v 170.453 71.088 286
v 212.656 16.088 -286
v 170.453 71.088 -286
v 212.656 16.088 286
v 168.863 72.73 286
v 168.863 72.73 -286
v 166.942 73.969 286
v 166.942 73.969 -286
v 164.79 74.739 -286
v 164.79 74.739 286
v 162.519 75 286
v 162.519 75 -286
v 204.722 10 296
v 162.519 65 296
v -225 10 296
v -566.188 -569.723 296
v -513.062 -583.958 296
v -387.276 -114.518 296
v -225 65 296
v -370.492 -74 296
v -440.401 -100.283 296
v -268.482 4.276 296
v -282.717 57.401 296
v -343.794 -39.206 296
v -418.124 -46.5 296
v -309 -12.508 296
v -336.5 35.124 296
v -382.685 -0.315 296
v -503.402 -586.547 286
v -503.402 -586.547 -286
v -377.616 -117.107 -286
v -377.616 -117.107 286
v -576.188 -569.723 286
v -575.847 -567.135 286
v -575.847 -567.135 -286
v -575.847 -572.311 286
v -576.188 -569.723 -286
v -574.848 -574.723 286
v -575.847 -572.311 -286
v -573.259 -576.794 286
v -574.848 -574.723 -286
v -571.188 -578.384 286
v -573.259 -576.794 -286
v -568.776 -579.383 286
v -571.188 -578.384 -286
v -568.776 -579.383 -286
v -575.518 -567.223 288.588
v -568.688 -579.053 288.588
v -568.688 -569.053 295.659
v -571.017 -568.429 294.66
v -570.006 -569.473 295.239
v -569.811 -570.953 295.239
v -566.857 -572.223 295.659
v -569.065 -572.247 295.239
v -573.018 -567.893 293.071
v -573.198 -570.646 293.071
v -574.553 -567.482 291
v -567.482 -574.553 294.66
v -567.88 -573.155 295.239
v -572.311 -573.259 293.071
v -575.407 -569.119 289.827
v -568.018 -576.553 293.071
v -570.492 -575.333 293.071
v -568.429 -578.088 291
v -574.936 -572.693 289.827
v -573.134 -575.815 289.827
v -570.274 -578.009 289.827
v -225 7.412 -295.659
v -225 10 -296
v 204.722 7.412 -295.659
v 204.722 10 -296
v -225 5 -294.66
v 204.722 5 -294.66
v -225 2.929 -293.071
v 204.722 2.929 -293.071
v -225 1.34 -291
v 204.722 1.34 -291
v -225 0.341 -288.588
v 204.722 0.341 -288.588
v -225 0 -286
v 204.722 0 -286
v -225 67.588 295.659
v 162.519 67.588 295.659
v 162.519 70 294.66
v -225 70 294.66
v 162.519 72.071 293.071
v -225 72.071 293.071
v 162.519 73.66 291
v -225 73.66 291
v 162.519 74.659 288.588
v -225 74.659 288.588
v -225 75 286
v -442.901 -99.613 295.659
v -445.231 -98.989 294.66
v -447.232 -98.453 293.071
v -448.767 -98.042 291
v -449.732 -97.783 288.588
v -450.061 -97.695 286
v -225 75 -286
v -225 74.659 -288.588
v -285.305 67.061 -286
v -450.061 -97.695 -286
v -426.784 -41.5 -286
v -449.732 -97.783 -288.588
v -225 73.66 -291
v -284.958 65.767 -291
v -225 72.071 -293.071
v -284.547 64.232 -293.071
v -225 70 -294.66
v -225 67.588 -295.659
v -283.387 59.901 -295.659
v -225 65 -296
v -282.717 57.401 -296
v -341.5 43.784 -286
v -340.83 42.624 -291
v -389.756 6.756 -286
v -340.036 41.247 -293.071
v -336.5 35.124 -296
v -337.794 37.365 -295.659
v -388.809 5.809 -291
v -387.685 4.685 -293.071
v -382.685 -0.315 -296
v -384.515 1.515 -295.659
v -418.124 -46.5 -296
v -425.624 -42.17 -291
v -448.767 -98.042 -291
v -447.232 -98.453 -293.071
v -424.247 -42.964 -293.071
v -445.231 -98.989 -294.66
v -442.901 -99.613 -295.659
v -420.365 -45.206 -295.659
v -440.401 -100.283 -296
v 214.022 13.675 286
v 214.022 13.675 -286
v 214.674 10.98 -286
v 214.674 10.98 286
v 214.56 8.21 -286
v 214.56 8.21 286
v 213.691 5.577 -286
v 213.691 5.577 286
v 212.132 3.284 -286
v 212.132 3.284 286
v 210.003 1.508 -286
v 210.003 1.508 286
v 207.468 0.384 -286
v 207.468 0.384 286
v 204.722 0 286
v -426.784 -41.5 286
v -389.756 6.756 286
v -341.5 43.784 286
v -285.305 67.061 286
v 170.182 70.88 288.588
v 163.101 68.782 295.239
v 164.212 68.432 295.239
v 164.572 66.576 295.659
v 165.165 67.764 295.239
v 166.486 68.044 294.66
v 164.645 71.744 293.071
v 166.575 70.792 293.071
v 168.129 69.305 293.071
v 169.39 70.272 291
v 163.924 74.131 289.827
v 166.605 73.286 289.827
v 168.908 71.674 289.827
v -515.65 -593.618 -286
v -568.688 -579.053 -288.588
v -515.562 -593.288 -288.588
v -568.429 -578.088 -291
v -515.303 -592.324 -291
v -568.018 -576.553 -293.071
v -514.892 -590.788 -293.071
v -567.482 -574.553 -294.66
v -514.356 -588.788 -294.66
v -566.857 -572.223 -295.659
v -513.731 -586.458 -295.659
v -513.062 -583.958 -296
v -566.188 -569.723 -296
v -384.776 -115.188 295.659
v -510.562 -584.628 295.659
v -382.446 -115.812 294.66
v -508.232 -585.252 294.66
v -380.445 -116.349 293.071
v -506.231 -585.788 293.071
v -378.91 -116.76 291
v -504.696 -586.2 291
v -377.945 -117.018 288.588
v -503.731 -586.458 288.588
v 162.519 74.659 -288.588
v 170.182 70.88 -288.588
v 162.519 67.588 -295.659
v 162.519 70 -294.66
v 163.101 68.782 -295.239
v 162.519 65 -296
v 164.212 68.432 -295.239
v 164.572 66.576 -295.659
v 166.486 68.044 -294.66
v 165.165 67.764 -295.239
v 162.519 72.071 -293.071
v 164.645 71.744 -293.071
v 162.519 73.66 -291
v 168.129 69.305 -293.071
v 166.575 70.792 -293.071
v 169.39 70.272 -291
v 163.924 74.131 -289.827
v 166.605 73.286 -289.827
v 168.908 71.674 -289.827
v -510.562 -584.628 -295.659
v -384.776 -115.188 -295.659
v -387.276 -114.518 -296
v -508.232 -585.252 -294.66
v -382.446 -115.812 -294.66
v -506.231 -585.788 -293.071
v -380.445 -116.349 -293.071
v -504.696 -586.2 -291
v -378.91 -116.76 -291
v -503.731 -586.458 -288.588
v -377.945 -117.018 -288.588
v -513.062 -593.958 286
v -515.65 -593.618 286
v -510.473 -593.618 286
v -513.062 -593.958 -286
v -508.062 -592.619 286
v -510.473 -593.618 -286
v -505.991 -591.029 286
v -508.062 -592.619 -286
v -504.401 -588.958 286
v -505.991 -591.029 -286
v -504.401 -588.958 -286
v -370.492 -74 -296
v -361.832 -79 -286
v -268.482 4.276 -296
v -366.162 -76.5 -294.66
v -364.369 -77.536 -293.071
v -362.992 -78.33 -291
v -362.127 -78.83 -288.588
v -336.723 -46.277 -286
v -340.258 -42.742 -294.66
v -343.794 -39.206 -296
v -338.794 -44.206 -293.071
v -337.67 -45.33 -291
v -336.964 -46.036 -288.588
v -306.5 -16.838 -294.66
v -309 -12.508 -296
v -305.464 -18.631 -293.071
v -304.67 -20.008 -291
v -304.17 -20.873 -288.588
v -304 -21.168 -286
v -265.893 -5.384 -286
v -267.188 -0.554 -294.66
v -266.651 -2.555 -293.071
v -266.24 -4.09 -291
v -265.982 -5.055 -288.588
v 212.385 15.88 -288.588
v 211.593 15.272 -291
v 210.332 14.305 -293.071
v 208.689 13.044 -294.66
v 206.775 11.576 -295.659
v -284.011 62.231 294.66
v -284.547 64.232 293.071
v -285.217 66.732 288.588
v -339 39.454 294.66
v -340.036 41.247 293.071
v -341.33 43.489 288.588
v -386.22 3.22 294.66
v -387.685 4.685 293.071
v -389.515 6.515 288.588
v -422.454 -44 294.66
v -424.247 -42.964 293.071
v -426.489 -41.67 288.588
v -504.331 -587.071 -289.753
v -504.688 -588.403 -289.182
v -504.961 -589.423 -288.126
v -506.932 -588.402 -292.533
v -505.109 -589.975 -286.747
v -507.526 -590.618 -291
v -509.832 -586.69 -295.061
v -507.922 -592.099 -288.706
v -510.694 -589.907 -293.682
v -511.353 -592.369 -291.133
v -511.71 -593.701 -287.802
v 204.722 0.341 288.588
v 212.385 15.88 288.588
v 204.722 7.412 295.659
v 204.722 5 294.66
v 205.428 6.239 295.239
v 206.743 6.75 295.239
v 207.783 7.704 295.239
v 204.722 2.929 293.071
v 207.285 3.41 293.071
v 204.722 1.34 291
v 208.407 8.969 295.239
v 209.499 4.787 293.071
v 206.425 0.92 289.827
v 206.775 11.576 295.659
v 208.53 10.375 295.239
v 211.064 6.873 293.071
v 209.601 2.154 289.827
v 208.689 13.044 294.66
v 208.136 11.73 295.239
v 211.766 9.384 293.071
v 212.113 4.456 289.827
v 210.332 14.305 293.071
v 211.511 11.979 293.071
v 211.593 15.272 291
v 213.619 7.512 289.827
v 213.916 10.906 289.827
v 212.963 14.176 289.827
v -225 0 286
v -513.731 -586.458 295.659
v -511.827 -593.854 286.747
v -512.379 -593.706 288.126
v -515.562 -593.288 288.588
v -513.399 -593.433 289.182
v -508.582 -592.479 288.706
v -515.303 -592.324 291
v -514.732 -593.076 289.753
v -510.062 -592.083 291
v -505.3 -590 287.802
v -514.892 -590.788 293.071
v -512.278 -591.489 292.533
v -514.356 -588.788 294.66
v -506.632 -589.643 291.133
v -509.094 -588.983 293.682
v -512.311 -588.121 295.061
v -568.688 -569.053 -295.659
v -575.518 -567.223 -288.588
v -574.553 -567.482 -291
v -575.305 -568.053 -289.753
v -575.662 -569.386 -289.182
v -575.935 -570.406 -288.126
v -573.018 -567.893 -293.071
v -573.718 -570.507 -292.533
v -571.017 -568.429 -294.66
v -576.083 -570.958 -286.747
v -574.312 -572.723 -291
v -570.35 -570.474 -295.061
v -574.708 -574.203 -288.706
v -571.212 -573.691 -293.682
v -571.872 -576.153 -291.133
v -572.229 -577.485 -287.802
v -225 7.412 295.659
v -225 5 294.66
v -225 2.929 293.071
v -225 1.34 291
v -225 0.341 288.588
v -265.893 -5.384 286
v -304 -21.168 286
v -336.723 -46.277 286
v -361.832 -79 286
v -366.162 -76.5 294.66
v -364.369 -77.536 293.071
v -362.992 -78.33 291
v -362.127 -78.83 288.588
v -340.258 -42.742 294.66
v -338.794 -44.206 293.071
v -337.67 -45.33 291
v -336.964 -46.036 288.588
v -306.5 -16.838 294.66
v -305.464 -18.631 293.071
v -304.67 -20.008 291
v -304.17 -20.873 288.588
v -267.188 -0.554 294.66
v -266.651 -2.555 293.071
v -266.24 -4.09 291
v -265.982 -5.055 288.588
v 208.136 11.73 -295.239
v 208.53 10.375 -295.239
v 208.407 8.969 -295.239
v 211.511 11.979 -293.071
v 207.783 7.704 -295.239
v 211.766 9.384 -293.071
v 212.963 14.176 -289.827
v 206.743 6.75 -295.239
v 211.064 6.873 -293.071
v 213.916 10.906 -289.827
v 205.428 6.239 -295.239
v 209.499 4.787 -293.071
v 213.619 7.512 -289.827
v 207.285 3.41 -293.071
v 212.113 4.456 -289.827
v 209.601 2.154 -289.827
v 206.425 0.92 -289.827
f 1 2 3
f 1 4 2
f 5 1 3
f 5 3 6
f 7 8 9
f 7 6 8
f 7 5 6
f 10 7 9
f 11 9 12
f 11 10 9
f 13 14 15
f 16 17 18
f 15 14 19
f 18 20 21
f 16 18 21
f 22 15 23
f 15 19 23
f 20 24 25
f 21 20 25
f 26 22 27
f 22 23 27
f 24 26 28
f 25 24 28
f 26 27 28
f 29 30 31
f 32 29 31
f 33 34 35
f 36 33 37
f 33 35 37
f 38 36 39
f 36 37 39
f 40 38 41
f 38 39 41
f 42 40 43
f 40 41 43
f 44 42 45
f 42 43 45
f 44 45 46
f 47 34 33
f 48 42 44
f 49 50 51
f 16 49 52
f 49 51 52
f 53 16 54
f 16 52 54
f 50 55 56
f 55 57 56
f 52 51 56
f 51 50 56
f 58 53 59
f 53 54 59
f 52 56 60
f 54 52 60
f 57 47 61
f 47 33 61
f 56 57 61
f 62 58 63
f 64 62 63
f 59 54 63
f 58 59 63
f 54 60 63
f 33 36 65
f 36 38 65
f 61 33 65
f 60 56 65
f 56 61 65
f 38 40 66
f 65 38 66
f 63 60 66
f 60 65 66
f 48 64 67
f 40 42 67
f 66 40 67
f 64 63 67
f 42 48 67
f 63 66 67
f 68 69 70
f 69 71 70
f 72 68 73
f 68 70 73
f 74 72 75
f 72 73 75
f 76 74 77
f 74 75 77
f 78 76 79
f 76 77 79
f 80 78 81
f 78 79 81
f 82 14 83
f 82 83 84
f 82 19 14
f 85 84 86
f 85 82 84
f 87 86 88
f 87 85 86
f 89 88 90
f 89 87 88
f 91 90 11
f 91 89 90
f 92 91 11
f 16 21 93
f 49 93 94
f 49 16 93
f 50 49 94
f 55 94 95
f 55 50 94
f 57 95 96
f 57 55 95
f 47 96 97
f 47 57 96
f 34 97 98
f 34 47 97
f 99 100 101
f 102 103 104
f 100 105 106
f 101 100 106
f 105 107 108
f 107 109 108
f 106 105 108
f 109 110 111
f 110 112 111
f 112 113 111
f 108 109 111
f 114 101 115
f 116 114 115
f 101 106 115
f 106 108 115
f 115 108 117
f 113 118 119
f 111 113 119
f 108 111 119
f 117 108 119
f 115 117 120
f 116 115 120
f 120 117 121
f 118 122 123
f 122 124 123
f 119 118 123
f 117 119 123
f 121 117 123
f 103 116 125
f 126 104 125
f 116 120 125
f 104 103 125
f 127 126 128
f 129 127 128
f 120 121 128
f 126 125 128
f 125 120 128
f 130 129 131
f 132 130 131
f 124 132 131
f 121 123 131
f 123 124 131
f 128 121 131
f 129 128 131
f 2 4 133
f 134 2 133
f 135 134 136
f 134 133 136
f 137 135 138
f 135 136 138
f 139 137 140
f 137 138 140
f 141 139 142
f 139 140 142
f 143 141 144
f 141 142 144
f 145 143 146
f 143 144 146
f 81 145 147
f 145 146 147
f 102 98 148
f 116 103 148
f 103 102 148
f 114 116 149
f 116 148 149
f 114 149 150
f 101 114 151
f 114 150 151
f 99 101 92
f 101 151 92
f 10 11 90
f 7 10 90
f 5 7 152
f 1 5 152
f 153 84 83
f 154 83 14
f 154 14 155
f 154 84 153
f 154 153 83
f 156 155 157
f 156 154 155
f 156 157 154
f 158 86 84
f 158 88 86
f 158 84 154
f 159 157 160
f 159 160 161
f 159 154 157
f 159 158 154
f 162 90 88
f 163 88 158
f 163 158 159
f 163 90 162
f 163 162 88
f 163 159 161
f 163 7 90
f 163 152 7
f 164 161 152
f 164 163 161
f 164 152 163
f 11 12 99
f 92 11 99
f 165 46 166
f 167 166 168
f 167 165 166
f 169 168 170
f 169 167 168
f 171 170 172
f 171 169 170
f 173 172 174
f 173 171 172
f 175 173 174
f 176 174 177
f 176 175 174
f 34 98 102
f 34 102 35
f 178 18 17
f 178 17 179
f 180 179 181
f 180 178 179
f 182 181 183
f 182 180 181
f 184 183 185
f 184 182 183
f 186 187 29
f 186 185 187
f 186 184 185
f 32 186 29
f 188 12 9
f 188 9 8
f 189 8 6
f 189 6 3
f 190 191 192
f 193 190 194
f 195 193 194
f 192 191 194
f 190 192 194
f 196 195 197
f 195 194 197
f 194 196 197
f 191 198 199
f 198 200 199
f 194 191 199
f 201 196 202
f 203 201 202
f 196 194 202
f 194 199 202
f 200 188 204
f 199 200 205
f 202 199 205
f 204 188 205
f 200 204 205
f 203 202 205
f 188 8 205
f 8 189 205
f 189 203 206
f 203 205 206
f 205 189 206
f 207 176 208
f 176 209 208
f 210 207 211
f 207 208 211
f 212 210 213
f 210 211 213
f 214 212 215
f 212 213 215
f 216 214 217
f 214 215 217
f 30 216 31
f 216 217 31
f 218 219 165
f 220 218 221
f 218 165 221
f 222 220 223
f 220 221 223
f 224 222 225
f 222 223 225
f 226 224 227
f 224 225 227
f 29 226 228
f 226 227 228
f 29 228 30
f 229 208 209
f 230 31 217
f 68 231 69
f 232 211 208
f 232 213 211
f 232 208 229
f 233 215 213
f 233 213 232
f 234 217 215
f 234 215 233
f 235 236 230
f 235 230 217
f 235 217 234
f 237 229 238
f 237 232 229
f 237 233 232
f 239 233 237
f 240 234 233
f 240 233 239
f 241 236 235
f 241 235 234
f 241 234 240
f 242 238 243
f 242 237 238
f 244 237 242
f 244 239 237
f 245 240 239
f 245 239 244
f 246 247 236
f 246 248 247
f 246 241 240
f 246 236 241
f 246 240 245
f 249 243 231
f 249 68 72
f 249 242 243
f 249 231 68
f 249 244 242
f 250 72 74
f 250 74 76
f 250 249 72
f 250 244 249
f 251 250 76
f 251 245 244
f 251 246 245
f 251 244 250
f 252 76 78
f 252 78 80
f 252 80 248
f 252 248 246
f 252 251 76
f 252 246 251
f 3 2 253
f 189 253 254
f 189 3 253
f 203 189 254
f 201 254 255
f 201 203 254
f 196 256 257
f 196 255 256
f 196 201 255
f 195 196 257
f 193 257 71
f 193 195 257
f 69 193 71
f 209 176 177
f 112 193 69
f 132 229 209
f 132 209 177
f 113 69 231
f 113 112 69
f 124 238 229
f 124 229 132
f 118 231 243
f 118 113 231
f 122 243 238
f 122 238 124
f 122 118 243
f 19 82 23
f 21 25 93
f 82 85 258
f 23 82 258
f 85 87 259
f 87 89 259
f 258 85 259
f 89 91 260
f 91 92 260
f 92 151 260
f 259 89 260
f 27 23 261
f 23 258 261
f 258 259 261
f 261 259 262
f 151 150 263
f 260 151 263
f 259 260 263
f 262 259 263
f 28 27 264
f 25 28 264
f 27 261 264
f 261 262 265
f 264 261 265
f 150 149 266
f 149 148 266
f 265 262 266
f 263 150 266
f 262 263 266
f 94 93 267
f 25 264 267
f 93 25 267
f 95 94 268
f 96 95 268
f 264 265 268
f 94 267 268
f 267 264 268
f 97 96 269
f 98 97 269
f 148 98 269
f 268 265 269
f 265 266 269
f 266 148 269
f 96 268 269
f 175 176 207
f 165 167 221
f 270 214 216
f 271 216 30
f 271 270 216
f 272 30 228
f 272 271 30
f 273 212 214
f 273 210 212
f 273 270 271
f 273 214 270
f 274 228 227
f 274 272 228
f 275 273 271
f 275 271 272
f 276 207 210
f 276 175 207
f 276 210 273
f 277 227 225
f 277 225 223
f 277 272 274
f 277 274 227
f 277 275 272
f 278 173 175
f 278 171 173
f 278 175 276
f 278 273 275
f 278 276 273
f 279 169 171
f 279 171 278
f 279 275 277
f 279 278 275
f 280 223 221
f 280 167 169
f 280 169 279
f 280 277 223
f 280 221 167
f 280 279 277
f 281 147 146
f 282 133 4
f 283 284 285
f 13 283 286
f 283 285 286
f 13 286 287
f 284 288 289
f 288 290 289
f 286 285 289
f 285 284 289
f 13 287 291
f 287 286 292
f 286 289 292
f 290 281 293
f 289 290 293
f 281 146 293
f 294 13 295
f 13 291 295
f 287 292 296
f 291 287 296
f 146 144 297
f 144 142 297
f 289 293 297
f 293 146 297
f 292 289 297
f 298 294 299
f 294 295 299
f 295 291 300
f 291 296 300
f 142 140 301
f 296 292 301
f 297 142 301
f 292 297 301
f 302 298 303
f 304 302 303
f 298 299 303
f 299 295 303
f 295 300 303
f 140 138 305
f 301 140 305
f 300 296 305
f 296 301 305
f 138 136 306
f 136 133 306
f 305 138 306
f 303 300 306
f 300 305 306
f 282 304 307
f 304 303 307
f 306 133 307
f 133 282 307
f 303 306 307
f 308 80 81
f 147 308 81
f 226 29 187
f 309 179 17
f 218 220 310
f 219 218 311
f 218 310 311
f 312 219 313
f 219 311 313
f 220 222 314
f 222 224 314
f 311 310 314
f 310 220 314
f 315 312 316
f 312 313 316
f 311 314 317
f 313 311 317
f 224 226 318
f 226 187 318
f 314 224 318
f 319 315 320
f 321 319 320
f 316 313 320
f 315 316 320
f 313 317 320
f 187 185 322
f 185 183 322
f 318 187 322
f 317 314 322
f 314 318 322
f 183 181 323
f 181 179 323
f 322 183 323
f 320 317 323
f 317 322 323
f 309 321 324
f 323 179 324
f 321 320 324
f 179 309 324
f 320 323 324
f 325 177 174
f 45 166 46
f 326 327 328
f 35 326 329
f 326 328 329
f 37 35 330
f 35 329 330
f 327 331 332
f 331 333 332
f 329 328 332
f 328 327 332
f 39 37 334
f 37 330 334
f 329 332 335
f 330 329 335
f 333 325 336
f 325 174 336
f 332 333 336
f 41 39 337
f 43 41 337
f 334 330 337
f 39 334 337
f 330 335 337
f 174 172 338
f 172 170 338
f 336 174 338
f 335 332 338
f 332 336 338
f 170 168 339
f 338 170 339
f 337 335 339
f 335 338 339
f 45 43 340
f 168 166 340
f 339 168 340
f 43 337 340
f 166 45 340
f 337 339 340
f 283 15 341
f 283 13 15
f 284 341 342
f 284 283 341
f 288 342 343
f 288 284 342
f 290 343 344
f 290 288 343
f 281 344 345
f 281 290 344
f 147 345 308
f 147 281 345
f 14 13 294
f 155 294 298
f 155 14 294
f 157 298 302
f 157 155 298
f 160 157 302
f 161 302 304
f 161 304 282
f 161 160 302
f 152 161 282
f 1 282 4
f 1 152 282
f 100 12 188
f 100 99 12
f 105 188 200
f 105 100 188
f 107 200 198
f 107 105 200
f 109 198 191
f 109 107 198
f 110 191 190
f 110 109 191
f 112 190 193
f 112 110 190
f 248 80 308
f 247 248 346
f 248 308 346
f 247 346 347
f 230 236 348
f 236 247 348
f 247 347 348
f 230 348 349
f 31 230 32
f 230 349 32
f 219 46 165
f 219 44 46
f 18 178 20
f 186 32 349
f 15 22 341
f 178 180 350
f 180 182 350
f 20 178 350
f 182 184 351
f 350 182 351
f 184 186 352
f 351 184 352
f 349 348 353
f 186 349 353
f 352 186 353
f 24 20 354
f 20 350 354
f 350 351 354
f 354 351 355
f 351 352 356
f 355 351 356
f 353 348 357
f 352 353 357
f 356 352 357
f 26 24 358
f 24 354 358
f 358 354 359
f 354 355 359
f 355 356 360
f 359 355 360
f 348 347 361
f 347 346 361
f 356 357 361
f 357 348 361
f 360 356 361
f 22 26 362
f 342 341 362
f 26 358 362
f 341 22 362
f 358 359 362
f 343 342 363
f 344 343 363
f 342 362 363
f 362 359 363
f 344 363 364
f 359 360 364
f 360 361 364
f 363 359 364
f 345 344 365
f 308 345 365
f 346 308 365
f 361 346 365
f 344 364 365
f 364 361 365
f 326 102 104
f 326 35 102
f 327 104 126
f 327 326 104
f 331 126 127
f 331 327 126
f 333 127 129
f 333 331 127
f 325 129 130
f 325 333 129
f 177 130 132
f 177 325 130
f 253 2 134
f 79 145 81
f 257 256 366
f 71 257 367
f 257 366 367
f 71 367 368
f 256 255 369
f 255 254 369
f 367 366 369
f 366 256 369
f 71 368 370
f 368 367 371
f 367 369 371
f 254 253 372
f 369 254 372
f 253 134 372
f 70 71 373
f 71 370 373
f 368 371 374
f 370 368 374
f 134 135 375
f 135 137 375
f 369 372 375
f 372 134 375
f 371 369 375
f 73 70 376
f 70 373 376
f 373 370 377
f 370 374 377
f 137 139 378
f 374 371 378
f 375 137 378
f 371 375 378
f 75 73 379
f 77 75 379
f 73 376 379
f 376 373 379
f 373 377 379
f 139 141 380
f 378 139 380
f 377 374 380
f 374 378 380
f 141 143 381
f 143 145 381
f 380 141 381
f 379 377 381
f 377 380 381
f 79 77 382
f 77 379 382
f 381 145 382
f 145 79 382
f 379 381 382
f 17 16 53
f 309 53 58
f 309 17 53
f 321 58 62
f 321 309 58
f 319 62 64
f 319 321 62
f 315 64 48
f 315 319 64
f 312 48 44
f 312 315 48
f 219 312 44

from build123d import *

# Parameters (mm, degrees)
BOSS_EXTRUDE1_DEPTH = 296
FILLET1_R           = 10


with BuildPart() as part:
    # Sketch1 → Boss-Extrude1 (new, symmetric)
    with BuildSketch(Plane.XY):
        with BuildLine():
            Line((-225, 75), (-225, 0))
            ThreePointArc((-225, 0), (-321.184305783, -32.650172234), (-377.616280554, -117.106590874))
            Line((-377.616280554, -117.106590874), (-450.060717525, -97.695162491))
            ThreePointArc((-450.060717525, -97.695162491), (-366.841412959, 26.851328288), (-225, 75))
        make_face()
        Polygon((167.450475902, 75), (-225, 75), (-225, 0), (225, 0), align=None)
        Polygon((-578.434963896, -576.79437233), (-505.990526925, -596.205800713), (-377.616280554, -117.106590874), (-450.060717525, -97.695162491), align=None)
    extrude(amount=BOSS_EXTRUDE1_DEPTH, both=True)

    # Fillet1
    fillet1_edges = [part.edges().sort_by_distance(p)[0] for p in [
        (0, 0, 296),
        (-542.21274541, -586.500086522, -296),
        (-514.247840711, -337.244767411, -296),
        (-366.841412959, 26.851328288, -296),
        (-28.774762049, 75, -296),
        (196.225237951, 37.5, -296),
        (0, 0, -296),
        (-321.184305783, -32.650172234, -296),
        (196.225237951, 37.5, 296),
        (-505.990526925, -596.205800713, 0),
        (-578.434963896, -576.79437233, 0),
        (167.450475902, 75, 0),
        (225, 0, 0),
        (-28.774762049, 75, 296),
        (-366.841412959, 26.851328288, 296),
        (-514.247840711, -337.244767411, 296),
        (-542.21274541, -586.500086522, 296),
        (-441.803403739, -356.656195793, 296),
        (-321.184305783, -32.650172234, 296),
        (-441.803403739, -356.656195793, -296),
    ]]
    fillet(fillet1_edges, radius=FILLET1_R)


solid = part.part
